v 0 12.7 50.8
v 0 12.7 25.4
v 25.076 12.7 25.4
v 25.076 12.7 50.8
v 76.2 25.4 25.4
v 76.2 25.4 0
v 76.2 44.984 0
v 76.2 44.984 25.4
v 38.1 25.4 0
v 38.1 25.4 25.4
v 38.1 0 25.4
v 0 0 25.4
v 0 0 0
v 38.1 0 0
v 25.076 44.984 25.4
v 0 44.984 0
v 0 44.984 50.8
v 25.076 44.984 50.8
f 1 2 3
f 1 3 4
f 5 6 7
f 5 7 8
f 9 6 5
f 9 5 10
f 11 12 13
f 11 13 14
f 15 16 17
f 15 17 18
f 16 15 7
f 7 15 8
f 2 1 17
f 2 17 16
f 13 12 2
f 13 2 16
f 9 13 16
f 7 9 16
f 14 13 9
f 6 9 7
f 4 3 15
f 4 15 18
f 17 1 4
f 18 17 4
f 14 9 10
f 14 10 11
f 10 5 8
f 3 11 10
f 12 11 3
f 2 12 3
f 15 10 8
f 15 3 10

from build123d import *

# Parameters (mm, degrees)
F0_W     = 25.075742
F0_H     = 25.4
F0_W_2   = 38.1
F3_DEPTH = 44.98379
F1_W     = 12.7
F1_H     = 25.4
F4_DEPTH = 25.60555
F5_DEPTH = 25.4


with BuildPart() as f3:
    # F0 (on Front) → F3 (new body)
    with BuildSketch(Plane.XZ):
        Polygon((0, 25.4), (0, 0), (38.1, 0), (38.1, 25.4), (25.075742, 25.4), align=None)
        with Locations((12.537871, 38.1)):
            Rectangle(F0_W, F0_H)
        with Locations((57.15, 12.7)):
            Rectangle(F0_W_2, F0_H)
    extrude(amount=-F3_DEPTH)

    # F1 (on Right) → F4 (cut)
    with BuildSketch(Plane.YZ):
        with Locations((6.35, 38.1)):
            Rectangle(F1_W, F1_H)
    extrude(amount=F4_DEPTH, mode=Mode.SUBTRACT)

    # F2 (on Top) → F5 (cut)
    with BuildSketch(Plane.XY):
        Polygon((76.496184, 0), (76.2, 25.4), (38.1, 25.4), (38.1, 0), align=None)
    extrude(amount=F5_DEPTH, mode=Mode.SUBTRACT)


solid = f3.part
